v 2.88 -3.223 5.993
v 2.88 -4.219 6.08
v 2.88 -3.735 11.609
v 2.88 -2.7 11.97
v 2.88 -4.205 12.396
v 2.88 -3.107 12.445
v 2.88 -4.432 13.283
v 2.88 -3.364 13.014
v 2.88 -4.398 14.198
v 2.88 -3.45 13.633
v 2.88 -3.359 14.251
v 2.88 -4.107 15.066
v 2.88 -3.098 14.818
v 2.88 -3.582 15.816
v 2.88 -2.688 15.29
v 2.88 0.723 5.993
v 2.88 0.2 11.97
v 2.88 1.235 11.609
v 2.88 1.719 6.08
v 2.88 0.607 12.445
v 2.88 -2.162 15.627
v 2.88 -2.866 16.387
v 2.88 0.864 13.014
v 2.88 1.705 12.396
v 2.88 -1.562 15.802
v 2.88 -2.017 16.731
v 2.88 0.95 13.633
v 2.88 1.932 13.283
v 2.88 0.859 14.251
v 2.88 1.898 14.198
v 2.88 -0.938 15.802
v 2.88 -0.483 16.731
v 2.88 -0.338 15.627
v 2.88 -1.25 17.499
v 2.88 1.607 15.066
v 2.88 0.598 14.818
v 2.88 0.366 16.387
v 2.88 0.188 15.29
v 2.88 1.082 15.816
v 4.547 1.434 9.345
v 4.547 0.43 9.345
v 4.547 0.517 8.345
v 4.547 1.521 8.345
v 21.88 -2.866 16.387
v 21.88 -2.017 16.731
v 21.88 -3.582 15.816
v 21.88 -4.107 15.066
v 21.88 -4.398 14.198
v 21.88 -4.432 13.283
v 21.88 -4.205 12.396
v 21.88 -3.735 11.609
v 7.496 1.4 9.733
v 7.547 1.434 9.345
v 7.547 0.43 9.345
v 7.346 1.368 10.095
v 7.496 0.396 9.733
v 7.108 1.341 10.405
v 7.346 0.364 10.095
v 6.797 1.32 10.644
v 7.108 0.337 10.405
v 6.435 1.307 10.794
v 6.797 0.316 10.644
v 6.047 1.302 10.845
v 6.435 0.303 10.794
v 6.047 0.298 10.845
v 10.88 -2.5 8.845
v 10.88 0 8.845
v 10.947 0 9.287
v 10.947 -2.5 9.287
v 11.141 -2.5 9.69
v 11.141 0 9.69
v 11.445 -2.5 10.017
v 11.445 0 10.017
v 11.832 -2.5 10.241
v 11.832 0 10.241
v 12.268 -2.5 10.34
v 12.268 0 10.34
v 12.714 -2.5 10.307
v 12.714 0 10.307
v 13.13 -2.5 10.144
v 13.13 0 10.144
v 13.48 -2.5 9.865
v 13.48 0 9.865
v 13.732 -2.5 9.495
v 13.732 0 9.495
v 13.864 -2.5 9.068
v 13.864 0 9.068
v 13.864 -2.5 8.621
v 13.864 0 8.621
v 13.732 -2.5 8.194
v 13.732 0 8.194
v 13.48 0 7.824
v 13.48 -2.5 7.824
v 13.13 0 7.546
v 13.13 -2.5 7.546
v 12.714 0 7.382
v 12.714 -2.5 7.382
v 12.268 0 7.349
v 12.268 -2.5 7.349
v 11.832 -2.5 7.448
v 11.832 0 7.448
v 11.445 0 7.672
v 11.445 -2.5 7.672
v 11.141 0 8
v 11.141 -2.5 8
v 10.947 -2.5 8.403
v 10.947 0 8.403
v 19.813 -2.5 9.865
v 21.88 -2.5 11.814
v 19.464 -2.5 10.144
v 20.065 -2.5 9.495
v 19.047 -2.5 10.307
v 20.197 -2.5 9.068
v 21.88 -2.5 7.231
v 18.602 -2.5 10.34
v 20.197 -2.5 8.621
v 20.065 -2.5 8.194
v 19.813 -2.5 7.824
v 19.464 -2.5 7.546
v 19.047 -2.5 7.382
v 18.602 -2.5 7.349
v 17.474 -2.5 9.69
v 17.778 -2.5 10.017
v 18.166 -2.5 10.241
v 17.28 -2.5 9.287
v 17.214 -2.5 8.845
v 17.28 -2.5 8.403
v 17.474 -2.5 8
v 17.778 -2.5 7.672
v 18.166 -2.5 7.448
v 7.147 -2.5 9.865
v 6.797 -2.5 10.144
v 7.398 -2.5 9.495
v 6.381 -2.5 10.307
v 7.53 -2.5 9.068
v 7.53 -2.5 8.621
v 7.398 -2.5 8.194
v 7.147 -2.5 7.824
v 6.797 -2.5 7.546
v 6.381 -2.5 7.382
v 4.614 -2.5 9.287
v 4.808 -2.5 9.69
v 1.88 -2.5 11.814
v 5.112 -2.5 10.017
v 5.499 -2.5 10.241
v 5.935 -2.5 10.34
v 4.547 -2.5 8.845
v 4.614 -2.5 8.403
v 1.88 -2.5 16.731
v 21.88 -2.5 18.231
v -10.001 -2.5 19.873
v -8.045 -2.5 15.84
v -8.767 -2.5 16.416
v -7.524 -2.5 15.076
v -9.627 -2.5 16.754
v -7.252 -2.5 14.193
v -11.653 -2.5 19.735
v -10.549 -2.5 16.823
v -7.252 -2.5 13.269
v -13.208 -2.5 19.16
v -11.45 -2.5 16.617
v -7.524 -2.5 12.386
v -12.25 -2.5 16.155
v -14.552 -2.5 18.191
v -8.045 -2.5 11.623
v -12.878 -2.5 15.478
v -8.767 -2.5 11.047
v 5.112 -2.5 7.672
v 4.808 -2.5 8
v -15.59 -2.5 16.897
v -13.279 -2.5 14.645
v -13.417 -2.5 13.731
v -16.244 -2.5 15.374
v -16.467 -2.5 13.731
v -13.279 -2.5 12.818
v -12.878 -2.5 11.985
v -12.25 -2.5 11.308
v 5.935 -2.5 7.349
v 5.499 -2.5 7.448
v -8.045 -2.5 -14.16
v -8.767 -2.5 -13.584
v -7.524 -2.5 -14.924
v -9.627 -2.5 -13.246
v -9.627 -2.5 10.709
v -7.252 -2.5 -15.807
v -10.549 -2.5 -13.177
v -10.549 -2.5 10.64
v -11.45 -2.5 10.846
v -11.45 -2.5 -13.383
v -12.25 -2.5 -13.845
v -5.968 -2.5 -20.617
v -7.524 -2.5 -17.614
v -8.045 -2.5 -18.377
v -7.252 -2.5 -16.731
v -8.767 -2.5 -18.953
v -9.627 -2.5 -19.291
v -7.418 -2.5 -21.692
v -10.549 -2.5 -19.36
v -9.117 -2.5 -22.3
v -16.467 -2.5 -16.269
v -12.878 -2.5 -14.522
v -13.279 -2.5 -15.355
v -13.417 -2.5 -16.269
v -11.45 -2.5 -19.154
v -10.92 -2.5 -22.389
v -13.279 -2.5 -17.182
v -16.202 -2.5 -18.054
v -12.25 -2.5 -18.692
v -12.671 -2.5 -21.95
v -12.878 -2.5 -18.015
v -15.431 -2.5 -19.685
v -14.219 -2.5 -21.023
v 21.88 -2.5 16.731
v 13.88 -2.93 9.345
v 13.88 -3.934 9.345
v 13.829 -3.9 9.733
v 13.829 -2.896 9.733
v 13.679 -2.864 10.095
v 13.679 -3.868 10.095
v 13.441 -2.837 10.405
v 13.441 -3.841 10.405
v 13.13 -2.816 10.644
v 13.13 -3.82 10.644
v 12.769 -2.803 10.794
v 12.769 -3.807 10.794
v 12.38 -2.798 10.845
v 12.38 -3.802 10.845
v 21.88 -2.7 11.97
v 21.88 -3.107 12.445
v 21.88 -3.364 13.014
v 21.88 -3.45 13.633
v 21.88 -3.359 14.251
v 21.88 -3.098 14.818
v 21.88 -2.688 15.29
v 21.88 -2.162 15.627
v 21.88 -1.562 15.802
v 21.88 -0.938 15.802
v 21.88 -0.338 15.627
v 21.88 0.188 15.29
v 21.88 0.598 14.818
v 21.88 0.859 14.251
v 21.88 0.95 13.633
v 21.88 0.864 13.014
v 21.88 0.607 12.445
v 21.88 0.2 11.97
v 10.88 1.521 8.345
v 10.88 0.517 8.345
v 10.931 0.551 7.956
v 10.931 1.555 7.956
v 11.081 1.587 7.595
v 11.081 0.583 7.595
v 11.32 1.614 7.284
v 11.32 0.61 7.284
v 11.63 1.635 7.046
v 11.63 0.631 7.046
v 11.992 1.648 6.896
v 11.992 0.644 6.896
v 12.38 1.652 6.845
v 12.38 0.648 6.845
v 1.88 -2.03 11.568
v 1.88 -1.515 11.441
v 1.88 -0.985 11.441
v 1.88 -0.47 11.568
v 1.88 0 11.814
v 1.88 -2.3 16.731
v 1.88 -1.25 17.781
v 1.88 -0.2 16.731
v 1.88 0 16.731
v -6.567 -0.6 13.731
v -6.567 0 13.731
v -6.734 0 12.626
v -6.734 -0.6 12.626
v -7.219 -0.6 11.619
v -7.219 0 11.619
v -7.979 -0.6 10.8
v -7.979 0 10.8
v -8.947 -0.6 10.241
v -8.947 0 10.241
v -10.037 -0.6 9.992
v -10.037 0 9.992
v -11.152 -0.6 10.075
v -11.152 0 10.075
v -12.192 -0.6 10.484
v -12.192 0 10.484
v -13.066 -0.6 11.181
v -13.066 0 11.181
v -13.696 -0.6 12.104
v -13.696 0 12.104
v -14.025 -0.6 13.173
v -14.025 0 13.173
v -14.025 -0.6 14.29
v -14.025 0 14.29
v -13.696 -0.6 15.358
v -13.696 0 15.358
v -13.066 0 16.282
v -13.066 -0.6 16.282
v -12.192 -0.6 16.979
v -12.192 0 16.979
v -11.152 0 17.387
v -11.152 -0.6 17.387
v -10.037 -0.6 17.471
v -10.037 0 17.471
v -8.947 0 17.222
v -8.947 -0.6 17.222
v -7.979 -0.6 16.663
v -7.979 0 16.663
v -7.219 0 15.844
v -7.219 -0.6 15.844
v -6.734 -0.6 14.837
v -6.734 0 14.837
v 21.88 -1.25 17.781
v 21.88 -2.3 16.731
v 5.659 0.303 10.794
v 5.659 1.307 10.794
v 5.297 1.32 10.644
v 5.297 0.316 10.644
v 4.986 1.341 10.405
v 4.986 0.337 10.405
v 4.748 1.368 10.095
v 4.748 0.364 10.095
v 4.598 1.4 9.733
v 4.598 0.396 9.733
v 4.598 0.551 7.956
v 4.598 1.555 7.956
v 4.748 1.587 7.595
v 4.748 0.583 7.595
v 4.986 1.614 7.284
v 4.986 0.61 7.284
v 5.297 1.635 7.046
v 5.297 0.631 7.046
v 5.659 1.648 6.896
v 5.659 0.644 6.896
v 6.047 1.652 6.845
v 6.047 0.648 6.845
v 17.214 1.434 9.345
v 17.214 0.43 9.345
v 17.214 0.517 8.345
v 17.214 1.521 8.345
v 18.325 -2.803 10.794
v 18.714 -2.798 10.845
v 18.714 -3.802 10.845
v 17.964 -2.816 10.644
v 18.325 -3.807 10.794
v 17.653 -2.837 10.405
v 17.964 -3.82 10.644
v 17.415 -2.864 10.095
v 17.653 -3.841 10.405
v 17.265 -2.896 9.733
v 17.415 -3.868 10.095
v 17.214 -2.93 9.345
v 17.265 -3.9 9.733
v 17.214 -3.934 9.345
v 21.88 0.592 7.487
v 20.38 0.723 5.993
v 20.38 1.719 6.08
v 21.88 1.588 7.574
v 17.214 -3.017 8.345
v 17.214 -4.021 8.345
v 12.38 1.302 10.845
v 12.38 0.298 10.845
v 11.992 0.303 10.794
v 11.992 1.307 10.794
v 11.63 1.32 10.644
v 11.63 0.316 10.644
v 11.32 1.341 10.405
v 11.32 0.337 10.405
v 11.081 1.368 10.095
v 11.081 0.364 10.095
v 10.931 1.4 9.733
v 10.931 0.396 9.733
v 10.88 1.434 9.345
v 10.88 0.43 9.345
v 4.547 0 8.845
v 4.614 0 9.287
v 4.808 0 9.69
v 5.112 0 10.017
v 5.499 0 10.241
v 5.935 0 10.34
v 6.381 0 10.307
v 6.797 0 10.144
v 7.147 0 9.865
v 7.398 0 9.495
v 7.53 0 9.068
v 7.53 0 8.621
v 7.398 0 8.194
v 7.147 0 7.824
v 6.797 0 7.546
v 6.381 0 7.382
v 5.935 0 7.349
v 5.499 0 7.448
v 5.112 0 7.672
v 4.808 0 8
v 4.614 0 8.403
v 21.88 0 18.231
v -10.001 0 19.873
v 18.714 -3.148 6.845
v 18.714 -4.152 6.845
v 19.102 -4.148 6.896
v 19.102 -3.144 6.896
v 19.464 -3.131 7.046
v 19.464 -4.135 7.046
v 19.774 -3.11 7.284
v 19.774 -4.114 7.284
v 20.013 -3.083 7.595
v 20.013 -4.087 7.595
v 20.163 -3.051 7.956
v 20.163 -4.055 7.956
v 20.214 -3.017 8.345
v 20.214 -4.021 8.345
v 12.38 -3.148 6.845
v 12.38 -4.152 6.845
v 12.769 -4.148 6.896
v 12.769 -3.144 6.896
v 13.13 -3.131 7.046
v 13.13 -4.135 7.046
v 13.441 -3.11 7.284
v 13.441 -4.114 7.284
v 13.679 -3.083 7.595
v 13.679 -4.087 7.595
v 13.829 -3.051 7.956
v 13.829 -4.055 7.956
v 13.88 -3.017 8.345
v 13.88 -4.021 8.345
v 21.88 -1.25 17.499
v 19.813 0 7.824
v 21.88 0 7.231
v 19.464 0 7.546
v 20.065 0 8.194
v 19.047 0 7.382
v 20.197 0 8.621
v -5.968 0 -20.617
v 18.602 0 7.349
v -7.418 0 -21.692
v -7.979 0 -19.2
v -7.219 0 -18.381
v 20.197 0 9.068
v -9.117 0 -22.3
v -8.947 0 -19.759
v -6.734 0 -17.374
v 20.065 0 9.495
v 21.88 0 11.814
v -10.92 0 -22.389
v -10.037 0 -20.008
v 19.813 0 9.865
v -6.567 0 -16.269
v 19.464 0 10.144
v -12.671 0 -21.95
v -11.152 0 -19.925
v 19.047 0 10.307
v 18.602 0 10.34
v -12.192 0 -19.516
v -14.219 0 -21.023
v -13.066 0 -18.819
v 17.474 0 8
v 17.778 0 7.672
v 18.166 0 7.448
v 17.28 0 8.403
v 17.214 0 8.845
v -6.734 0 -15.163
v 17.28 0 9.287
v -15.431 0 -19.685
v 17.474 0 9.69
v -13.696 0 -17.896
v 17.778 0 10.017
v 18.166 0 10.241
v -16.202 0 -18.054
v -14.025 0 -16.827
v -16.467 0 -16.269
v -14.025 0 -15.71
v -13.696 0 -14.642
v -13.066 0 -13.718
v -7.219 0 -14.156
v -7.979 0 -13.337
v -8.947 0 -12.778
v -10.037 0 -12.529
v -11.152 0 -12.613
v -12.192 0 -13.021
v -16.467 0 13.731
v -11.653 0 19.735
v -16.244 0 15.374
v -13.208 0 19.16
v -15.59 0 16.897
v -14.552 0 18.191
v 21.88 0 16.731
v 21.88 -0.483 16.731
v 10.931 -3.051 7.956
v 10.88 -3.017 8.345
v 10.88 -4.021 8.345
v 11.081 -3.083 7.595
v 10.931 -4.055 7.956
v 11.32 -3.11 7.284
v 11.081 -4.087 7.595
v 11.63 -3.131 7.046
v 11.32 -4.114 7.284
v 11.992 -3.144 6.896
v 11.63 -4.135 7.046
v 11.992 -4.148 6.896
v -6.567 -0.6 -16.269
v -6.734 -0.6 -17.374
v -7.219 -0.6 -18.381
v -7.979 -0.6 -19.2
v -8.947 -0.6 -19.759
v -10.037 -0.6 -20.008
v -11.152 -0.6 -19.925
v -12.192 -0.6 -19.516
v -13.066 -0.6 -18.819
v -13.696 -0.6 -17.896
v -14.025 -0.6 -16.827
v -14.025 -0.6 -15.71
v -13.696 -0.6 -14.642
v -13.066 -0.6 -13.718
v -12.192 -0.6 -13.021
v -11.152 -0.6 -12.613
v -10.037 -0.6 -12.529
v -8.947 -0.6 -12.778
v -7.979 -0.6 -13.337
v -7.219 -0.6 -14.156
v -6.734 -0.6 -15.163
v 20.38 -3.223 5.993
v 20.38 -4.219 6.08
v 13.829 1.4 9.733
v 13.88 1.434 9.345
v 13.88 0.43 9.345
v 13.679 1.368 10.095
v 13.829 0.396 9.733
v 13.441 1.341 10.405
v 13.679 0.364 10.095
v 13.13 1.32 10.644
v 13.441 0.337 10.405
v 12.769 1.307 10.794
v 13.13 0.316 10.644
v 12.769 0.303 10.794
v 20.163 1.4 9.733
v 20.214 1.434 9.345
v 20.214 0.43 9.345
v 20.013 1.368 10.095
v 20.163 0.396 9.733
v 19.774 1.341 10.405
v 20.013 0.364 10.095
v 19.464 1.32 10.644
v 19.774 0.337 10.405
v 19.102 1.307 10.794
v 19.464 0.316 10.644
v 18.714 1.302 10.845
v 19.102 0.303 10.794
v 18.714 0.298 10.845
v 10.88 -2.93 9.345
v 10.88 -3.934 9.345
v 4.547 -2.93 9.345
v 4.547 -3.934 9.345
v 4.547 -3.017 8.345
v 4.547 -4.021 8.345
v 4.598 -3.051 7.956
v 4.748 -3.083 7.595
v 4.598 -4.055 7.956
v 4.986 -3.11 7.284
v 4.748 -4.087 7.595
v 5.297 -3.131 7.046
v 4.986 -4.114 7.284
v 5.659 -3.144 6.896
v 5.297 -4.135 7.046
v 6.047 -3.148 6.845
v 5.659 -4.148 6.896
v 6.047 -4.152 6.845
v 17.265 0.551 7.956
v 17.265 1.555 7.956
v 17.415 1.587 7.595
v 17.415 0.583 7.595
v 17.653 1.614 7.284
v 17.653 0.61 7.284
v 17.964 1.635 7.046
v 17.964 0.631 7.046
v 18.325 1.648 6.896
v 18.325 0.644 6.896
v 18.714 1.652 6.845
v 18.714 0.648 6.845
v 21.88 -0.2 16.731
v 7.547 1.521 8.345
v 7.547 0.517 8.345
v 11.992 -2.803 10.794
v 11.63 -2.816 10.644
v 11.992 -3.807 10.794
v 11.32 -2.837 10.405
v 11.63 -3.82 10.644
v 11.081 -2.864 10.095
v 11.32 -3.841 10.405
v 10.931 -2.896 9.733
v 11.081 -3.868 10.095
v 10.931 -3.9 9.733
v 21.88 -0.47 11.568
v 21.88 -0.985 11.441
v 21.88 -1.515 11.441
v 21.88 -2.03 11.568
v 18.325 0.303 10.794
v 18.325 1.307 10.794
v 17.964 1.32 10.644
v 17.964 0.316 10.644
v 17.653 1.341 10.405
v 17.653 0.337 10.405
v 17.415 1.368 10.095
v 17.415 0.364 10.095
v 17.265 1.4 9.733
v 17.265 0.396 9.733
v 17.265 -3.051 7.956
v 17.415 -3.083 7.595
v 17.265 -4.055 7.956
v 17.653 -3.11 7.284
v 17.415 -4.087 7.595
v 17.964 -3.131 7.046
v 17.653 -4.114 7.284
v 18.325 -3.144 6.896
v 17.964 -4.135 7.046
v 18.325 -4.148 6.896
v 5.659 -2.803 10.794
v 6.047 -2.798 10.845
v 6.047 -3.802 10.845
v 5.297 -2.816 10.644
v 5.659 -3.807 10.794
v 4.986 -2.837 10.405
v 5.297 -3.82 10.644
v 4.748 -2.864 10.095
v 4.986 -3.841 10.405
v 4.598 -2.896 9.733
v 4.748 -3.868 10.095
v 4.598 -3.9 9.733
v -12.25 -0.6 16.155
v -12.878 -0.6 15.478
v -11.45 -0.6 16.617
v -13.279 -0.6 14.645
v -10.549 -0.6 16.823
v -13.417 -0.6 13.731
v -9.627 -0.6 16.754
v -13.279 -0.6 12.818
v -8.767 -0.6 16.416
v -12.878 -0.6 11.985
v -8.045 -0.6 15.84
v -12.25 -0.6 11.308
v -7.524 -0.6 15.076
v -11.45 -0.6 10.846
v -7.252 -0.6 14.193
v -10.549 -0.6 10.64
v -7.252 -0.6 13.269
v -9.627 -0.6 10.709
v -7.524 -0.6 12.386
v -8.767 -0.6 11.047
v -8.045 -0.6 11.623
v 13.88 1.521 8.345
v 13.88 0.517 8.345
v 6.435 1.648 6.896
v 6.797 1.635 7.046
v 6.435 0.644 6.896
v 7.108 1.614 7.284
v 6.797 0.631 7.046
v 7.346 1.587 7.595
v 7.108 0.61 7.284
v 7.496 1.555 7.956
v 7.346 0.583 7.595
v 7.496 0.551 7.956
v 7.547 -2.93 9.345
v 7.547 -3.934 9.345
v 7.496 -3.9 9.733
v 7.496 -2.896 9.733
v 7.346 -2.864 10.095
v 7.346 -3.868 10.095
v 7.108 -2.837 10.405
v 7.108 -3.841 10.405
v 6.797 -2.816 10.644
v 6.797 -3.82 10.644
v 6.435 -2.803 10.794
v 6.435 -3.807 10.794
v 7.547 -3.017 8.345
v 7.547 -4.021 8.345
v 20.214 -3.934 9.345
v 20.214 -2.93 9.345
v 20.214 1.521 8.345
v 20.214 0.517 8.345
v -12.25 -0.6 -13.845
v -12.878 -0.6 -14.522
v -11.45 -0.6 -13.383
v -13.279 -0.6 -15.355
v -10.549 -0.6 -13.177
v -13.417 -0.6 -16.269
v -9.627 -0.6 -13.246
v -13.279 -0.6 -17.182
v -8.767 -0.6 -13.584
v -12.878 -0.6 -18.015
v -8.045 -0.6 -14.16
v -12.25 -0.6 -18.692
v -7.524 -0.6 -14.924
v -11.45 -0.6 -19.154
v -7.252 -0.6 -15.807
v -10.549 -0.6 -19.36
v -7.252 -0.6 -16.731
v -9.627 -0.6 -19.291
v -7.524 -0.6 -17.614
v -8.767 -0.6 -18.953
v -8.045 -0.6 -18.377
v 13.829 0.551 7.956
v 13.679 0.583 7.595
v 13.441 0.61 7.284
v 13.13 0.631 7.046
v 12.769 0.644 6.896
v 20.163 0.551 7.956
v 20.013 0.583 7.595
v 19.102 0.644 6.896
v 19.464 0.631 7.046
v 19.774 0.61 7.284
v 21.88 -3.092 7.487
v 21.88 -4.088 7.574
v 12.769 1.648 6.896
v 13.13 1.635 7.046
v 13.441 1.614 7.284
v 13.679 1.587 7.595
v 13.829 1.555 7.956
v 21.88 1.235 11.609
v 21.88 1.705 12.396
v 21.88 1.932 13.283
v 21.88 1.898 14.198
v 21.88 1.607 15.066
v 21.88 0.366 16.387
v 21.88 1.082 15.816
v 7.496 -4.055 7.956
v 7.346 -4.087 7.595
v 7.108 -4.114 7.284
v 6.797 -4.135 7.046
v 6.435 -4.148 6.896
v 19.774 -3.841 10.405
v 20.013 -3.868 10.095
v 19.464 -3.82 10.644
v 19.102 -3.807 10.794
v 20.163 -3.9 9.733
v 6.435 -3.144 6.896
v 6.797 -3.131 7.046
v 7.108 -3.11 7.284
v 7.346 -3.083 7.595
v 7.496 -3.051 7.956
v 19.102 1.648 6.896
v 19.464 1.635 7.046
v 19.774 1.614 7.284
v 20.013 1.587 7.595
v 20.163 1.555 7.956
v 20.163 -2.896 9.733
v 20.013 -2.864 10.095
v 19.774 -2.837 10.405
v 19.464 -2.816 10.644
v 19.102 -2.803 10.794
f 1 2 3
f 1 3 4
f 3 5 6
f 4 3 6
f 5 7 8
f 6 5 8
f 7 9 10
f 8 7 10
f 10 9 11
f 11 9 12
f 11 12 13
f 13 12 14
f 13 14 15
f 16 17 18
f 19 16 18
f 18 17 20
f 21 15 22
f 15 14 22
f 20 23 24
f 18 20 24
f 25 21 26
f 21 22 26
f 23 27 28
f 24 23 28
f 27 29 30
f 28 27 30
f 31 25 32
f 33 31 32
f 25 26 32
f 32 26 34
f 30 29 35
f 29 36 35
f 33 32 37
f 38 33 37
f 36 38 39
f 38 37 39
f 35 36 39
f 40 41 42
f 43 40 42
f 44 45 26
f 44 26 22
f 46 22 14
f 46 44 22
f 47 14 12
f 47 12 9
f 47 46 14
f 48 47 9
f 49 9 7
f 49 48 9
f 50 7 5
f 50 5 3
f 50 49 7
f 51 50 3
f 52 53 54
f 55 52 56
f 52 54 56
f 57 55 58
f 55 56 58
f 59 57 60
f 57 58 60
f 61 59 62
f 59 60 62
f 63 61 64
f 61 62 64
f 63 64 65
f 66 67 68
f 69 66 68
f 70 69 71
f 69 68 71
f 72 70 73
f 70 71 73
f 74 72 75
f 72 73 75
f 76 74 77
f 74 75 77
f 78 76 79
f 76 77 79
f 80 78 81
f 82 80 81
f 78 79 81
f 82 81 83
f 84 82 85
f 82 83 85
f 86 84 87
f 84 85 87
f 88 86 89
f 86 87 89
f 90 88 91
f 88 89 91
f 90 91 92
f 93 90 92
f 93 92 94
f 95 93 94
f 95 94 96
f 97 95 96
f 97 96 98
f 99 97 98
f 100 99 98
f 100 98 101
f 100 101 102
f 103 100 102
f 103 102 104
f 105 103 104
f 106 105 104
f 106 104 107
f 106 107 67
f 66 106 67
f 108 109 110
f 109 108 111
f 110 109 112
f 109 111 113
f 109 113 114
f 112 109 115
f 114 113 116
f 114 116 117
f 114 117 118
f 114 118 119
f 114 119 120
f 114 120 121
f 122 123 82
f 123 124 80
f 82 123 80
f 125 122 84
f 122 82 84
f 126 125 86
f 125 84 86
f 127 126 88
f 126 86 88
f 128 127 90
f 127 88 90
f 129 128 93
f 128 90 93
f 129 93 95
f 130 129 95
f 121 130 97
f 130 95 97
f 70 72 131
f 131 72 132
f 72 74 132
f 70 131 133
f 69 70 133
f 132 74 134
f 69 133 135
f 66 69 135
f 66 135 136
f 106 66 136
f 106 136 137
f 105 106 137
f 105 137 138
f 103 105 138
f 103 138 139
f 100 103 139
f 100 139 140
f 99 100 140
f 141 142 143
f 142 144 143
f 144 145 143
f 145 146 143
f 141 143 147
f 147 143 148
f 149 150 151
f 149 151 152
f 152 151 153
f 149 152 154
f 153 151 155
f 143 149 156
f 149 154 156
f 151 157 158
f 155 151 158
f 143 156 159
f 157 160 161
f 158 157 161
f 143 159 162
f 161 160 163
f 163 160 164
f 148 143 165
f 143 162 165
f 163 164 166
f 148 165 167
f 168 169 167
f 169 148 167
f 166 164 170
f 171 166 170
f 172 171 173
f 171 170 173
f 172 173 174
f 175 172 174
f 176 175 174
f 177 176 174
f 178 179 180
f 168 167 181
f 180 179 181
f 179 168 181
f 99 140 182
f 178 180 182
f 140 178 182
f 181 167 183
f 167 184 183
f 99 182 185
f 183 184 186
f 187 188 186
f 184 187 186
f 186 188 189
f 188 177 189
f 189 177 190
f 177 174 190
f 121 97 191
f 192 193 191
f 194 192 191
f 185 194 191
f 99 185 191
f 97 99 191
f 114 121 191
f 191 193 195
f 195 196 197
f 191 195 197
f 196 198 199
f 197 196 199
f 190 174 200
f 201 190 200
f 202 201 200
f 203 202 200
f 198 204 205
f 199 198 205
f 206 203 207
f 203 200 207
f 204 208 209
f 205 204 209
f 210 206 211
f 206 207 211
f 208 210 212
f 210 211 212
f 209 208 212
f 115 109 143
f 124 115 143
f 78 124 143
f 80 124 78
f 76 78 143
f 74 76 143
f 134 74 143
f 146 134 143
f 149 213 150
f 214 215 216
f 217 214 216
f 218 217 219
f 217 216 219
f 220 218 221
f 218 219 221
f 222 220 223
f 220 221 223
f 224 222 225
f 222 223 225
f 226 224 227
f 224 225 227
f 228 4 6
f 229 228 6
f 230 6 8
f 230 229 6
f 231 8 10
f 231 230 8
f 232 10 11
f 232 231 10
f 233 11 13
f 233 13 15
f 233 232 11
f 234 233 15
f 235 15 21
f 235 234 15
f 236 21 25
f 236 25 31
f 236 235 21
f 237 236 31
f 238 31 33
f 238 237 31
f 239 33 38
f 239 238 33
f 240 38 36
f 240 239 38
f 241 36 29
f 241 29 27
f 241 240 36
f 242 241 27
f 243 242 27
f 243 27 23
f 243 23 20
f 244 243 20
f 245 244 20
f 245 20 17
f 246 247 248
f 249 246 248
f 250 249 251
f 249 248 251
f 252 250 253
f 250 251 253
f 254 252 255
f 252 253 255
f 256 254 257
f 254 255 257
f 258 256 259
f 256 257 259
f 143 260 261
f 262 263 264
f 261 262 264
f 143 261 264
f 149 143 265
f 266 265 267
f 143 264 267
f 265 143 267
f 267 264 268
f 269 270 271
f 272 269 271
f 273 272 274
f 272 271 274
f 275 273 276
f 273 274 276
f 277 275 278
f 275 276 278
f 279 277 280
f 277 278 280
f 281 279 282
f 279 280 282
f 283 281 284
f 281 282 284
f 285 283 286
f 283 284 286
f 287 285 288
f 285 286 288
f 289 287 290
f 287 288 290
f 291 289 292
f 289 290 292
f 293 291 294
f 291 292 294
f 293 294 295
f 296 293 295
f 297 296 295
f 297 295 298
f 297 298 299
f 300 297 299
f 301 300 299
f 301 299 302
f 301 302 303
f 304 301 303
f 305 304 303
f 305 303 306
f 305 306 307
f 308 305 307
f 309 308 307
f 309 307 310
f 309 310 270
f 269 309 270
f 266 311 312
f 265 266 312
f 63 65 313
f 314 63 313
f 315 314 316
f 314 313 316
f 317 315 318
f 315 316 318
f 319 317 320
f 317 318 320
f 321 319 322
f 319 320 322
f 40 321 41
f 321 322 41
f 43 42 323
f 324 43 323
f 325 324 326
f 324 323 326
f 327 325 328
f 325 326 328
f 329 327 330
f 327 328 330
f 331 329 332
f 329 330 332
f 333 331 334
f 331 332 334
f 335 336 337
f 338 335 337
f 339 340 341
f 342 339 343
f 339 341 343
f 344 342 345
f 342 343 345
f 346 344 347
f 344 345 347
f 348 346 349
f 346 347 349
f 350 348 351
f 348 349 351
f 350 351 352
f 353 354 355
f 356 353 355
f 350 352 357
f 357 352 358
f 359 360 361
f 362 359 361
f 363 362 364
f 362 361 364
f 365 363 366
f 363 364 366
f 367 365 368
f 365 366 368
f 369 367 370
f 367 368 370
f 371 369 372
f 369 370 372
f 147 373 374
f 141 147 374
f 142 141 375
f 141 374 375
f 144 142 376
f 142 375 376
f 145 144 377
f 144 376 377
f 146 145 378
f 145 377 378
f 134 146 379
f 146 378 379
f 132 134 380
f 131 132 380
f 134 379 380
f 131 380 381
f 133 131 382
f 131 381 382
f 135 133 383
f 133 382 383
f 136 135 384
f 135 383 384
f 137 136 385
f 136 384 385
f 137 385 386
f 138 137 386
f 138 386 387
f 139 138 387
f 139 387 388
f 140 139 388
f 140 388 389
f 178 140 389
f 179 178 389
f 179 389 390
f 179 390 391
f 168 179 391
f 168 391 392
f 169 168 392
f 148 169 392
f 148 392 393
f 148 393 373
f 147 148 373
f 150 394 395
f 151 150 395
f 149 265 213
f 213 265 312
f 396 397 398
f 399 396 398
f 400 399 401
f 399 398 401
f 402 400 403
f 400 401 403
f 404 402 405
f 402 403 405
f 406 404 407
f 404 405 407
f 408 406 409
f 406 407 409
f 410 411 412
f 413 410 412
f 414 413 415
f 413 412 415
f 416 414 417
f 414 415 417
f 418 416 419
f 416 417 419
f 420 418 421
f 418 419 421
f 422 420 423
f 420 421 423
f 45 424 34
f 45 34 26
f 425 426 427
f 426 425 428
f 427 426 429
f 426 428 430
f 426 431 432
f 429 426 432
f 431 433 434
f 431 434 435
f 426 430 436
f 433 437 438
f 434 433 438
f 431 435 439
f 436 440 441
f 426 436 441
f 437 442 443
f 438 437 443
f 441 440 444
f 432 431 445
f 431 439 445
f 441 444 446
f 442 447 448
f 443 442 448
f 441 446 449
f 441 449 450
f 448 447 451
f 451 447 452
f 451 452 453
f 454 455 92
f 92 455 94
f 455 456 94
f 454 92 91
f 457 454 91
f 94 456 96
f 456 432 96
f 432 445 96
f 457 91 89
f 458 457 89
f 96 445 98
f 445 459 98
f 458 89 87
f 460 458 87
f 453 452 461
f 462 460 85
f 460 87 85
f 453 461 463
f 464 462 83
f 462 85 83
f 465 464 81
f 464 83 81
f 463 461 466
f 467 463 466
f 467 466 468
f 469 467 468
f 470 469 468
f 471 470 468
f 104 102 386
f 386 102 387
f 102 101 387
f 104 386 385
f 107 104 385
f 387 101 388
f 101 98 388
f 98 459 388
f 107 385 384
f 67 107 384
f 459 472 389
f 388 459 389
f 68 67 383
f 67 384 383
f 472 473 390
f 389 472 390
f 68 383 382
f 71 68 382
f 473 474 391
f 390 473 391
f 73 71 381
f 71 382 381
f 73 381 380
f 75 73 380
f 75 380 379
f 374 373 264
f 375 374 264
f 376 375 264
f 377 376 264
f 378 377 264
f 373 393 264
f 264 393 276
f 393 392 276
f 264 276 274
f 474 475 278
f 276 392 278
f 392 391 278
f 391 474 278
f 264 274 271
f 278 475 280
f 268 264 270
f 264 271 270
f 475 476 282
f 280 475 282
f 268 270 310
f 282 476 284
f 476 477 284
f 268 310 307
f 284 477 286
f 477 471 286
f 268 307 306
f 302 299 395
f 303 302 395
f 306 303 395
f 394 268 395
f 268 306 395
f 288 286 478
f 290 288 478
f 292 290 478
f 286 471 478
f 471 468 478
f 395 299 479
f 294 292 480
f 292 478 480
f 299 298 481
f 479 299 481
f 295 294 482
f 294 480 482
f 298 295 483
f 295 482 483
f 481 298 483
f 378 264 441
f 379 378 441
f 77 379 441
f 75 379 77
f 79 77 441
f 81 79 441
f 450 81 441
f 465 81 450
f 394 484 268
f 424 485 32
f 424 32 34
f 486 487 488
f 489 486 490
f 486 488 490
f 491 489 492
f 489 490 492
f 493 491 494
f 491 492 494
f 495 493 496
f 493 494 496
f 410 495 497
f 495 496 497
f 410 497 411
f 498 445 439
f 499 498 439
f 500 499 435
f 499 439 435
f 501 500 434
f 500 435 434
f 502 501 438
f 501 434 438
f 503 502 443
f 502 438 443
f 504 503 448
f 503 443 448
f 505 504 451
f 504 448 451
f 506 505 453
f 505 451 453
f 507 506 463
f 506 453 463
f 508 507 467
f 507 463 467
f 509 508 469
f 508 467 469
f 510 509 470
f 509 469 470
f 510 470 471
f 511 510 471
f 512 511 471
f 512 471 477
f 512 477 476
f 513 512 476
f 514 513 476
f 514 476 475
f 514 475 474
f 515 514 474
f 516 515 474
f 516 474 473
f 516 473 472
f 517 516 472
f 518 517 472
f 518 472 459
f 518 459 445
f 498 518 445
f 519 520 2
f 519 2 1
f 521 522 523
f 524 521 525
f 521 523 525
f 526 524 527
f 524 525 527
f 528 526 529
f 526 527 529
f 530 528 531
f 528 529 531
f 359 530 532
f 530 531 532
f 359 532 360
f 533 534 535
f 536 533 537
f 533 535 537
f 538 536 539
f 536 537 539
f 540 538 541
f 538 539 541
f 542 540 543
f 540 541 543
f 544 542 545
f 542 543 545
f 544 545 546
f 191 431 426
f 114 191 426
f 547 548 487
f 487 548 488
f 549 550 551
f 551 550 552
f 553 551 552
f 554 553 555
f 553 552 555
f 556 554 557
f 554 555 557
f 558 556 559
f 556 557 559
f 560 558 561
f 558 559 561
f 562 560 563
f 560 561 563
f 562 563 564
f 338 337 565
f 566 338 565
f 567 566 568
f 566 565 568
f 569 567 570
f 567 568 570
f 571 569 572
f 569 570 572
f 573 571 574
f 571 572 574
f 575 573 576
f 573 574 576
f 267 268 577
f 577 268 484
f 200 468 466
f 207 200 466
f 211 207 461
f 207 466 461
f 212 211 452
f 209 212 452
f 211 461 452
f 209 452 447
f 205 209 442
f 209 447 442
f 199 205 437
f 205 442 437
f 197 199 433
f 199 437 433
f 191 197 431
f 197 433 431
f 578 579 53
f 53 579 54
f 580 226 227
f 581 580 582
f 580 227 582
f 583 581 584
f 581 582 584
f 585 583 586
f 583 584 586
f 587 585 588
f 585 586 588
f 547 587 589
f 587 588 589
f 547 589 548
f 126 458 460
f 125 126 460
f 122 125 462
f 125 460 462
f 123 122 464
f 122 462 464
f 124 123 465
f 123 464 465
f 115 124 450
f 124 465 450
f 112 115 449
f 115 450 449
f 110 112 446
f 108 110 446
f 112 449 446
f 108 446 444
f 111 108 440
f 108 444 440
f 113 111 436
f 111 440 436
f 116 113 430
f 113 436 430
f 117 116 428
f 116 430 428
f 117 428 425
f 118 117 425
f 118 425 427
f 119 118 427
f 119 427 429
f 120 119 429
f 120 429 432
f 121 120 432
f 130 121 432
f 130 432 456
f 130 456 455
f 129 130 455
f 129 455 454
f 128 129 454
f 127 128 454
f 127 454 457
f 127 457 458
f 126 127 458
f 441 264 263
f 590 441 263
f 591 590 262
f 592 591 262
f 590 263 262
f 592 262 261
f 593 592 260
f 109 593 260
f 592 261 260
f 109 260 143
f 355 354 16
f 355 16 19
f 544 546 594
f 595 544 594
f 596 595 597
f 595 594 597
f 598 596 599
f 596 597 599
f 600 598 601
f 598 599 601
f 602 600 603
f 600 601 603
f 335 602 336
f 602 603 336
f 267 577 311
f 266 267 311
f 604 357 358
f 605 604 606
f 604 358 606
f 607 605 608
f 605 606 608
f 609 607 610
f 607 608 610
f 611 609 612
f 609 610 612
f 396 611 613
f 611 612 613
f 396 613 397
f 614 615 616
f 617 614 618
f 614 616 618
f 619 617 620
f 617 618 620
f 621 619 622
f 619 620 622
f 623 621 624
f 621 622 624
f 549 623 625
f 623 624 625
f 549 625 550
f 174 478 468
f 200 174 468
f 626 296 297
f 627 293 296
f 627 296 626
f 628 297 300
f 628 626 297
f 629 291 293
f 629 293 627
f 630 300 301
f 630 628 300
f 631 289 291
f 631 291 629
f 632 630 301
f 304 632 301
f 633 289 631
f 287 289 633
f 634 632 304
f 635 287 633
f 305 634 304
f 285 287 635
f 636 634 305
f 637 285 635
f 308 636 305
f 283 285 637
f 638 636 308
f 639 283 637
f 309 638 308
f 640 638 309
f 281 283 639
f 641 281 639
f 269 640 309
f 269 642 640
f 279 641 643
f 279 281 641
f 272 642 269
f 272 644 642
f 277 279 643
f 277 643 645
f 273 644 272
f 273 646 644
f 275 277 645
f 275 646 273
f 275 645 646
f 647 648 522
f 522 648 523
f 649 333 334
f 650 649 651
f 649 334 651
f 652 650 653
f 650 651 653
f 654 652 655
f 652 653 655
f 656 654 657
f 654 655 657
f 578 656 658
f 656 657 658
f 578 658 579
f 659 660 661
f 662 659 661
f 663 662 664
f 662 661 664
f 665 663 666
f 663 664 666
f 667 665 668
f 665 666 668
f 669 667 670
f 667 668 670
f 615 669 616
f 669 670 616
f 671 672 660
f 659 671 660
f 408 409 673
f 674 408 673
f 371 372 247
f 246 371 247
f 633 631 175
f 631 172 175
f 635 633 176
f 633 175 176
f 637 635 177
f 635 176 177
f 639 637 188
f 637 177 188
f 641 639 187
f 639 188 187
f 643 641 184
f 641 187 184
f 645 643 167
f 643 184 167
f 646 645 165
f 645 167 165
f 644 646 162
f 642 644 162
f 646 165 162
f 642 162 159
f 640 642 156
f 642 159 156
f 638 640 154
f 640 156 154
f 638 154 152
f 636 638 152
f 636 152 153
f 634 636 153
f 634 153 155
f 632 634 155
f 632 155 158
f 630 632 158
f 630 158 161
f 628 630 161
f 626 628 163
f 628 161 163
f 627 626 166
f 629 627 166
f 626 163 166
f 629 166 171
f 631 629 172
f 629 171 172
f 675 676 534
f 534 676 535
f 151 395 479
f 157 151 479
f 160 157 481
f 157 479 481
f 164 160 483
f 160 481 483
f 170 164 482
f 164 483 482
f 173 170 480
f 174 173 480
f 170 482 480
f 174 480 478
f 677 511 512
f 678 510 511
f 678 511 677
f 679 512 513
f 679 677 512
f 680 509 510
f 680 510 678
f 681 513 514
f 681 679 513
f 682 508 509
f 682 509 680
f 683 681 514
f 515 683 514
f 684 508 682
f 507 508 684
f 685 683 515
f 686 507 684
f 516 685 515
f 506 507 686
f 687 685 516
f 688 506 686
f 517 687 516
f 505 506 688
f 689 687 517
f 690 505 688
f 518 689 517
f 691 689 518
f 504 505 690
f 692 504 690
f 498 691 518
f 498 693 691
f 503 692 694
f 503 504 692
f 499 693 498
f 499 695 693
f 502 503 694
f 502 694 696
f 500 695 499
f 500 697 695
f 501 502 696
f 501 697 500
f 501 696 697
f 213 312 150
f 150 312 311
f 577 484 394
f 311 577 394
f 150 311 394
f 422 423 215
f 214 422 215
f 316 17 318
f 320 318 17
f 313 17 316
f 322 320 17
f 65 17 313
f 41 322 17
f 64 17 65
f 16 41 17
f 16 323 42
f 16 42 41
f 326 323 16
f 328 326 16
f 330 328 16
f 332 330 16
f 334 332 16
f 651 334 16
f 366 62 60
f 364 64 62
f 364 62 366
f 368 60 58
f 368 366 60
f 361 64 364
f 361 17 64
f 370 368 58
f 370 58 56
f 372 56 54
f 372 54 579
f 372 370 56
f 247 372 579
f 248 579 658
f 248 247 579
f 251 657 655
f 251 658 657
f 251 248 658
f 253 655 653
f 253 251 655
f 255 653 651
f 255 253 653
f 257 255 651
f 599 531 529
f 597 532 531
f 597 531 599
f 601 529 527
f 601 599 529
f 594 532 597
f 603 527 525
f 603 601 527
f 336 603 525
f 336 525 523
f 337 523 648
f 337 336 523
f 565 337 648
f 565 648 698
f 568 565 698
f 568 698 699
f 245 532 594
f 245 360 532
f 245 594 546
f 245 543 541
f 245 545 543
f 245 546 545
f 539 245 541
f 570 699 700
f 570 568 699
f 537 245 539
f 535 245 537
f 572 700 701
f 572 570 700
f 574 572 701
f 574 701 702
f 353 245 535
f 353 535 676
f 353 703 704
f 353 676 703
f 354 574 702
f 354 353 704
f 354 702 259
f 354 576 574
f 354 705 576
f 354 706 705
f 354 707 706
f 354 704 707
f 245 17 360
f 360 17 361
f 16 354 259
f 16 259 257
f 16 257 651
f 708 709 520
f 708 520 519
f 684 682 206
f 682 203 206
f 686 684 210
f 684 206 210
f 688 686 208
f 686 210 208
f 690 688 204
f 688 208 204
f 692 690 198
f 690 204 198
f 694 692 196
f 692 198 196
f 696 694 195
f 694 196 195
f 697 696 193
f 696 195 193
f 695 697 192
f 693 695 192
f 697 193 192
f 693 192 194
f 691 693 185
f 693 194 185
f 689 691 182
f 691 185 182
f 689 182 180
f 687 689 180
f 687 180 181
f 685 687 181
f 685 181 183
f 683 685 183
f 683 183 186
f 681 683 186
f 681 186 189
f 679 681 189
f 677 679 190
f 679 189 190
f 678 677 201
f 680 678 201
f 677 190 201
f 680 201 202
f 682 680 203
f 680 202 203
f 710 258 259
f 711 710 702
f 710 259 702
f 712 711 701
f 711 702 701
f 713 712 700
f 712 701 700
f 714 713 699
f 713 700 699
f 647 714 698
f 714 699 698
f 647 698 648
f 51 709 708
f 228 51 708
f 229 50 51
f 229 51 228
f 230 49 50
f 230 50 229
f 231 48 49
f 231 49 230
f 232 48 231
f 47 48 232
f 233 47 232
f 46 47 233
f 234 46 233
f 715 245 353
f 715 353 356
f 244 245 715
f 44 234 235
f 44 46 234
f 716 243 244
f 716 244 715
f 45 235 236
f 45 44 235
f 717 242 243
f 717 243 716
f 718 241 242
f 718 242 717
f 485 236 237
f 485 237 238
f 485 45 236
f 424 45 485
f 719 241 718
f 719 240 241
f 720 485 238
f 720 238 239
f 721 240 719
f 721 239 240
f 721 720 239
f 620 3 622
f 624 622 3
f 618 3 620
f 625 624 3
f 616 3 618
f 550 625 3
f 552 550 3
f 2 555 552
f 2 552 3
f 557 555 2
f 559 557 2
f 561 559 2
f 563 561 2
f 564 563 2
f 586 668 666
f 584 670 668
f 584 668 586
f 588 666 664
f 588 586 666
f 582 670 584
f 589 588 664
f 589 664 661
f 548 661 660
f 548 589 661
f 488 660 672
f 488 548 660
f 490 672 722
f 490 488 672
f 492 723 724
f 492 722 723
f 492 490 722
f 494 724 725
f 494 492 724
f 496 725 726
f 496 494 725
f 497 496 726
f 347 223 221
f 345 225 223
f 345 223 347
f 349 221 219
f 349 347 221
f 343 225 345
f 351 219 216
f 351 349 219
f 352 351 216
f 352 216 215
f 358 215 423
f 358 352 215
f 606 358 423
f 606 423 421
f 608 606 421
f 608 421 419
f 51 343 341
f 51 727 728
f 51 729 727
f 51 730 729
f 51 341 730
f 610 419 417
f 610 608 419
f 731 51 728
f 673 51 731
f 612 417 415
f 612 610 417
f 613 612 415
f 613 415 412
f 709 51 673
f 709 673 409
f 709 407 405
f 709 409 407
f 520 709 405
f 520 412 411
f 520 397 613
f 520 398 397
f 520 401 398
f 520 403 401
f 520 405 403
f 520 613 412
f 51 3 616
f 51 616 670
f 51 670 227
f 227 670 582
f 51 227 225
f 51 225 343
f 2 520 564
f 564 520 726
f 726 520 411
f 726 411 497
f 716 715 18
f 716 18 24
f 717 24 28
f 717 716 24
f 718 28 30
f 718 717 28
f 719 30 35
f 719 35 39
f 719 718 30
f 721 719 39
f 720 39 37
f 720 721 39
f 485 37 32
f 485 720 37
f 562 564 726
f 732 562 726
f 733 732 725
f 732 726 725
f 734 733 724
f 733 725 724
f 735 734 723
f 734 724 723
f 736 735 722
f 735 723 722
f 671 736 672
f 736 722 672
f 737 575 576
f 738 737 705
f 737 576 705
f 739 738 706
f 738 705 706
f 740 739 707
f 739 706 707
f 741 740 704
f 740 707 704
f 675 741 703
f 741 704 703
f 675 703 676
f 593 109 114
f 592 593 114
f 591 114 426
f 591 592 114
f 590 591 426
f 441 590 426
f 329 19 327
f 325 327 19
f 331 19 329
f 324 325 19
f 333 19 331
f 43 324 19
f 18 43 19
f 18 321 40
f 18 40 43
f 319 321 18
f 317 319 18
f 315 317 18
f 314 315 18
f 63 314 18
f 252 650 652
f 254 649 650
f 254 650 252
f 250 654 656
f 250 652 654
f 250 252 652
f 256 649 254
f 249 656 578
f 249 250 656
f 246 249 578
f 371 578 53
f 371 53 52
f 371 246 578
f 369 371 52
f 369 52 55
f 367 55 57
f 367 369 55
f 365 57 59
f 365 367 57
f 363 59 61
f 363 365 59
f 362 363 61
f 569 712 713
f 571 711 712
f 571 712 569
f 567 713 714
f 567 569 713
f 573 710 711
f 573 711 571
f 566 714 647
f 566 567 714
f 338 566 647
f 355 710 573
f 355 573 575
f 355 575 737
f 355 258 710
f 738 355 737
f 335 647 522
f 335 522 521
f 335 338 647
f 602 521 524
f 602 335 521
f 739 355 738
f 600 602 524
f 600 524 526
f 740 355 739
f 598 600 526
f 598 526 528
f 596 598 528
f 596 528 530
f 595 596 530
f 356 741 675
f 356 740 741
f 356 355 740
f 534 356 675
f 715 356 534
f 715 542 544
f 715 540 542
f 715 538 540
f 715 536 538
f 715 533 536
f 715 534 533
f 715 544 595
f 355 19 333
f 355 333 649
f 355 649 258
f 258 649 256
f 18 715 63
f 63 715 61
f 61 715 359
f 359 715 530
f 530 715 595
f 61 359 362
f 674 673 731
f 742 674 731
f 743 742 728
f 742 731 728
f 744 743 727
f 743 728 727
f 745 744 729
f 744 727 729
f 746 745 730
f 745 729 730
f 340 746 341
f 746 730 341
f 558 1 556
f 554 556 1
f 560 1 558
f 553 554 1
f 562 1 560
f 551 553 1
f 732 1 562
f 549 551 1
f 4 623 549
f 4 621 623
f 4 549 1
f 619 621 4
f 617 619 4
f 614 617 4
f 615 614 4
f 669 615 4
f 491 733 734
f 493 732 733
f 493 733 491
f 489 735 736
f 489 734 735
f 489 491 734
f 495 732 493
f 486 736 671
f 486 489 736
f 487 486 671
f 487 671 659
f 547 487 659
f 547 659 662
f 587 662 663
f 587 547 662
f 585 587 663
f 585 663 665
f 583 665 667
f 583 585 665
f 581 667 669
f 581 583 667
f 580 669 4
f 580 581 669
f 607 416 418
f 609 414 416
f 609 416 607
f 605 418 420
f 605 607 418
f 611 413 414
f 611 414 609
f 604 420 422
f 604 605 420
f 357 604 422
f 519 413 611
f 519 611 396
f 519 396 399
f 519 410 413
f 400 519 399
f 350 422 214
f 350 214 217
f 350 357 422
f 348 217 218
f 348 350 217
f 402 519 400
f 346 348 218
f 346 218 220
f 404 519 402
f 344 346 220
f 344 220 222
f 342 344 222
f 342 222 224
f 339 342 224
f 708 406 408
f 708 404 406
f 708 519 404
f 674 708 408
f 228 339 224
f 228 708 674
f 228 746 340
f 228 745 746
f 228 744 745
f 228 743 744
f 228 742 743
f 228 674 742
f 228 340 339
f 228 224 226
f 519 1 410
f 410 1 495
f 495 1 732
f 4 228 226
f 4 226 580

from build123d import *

# Parameters (mm, degrees)
F1_DEPTH        = 2.5
F3_DEPTH        = 20
F6_DEPTH        = 19
F8_DEPTH        = 20
F11_D           = 3
F11_DEPTH       = 5
F11_START       = 5
F11_TIP         = 0.9012909285
F12_DEPTH       = 25
F13_SIZE        = 1.5
F14_D           = 6.2
F14_DEPTH       = 5
F14_CBORE_D     = 7.5
F14_CBORE_DEPTH = 0.6
F14_TIP         = 1.862667919


with BuildPart() as f1:
    # F0 (on Front) → F1 (new body)
    with BuildSketch(Plane.XZ):
        with BuildLine():
            ThreePointArc((-10.0007775515, 19.8732864219), (-14.5524809274, 18.190560255), (-16.4670801936, 13.7314257398))
            Line((-16.4670801936, 13.7314257398), (-16.4670801936, -16.2685742602))
            ThreePointArc((-16.4670801936, -16.2685742602), (-12.6705833026, -21.9504333851), (-5.9683734893, -20.6172809645))
            Line((-5.9683734893, -20.6172809645), (21.880333215, 7.2314257398))
            Line((21.880333215, 7.2314257398), (21.880333215, 10.7314257398))
            Line((21.880333215, 10.7314257398), (1.880333215, 10.7314257398))
            Line((1.880333215, 10.7314257398), (1.880333215, 16.7314257398))
            Line((1.880333215, 16.7314257398), (21.880333215, 16.7314257398))
            Line((21.880333215, 16.7314257398), (21.880333215, 18.2314257398))
            Line((21.880333215, 18.2314257398), (-10.0007775515, 19.8732864219))
        make_face()
    extrude(amount=F1_DEPTH)

    # F2 (on face) → F3 (cut, through all)
    with BuildSketch(Plane.YZ.offset(21.880333215)):
        Polygon((-1.25, 17.7814257398), (-2.3, 16.7314257398), (-0.2, 16.7314257398), align=None)
    extrude(amount=-F3_DEPTH, mode=Mode.SUBTRACT)

    # F7 (on face) → F8 (join, through all)
    with BuildSketch(Plane.YZ.offset(1.880333215)):
        with BuildLine():
            Line((-2.5, 11.8143575804), (-2.5, 10.7314257398))
            Line((-2.5, 10.7314257398), (0, 10.7314257398))
            Line((0, 10.7314257398), (0, 11.8143575804))
            ThreePointArc((0, 11.8143575804), (-1.25, 11.4247442795), (-2.5, 11.8143575804))
        make_face()
    extrude(amount=F8_DEPTH)

    # F11
    # its depths count from where the whole tool has entered the part; down to there all is cleared
    with Locations(Plane.XZ.offset(7.5).offset(-F11_START)):
        with Locations((6.0469998817, 8.8446571536), (12.380333215, 8.8446571536), (18.7136665483, 8.8446571536)):
            Hole(F11_D / 2, depth=F11_DEPTH)
            with Locations((0, 0, -(F11_DEPTH + F11_TIP / 2))):  # 118° drill point
                Cone(0, F11_D / 2, F11_TIP, mode=Mode.SUBTRACT)

    # F14
    with Locations(Plane(origin=(0, 0, 0), x_dir=(1, 0, 0), z_dir=(0, 1, 0))):
        with Locations((-10.3170801936, -13.7314257398), (-10.3170801936, 16.2685742602)):
            CounterBoreHole(F14_D / 2, F14_CBORE_D / 2, F14_CBORE_DEPTH, depth=F14_DEPTH)
            with Locations((0, 0, -(F14_DEPTH + F14_TIP / 2))):  # 118° drill point
                Cone(0, F14_D / 2, F14_TIP, mode=Mode.SUBTRACT)


with BuildPart() as f6:
    # F5 (on offset) → F6 (new body)
    with BuildSketch(Plane.YZ.offset(21.880333215)):
        with BuildLine():
            ThreePointArc((-2.7, 11.9702050687), (-1.25, 15.8247442795), (0.2, 11.9702050687))
            Line((0.2, 11.9702050687), (0.7229344565, 5.9930368801))
            Line((0.7229344565, 5.9930368801), (1.7191291546, 6.0801926229))
            Line((1.7191291546, 6.0801926229), (1.2354105403, 11.6091216842))
            ThreePointArc((1.2354105403, 11.6091216842), (1.7838587769, 14.642438203), (-0.4828427125, 16.7314257398))
            Line((-0.4828427125, 16.7314257398), (-1.25, 17.4985830274))
            Line((-1.25, 17.4985830274), (-2.0171572875, 16.7314257398))
            ThreePointArc((-2.0171572875, 16.7314257398), (-4.2838587769, 14.642438203), (-3.7354105403, 11.6091216842))
            Line((-3.7354105403, 11.6091216842), (-4.2191291546, 6.0801926229))
            Line((-4.2191291546, 6.0801926229), (-3.2229344565, 5.9930368801))
            Line((-3.2229344565, 5.9930368801), (-2.7, 11.9702050687))
        make_face()
    extrude(amount=-F6_DEPTH)

    # F10 (on offset) → F12 (cut)
    with BuildSketch(Plane.XZ.offset(7.5)):
        with BuildLine():
            ThreePointArc((4.5469998817, 8.3446571536), (4.9863397099, 7.2839969818), (6.0469998817, 6.8446571536))
            ThreePointArc((6.0469998817, 6.8446571536), (7.1076600534, 7.2839969818), (7.5469998817, 8.3446571536))
            Line((7.5469998817, 8.3446571536), (7.5469998817, 9.3446571536))
            ThreePointArc((7.5469998817, 9.3446571536), (7.1076600534, 10.4053173253), (6.0469998817, 10.8446571536))
            ThreePointArc((6.0469998817, 10.8446571536), (4.9863397099, 10.4053173253), (4.5469998817, 9.3446571536))
            Line((4.5469998817, 9.3446571536), (4.5469998817, 8.3446571536))
        make_face()
        with BuildLine():
            ThreePointArc((10.880333215, 8.3446571536), (11.3196730432, 7.2839969818), (12.380333215, 6.8446571536))
            ThreePointArc((12.380333215, 6.8446571536), (13.4409933868, 7.2839969818), (13.880333215, 8.3446571536))
            Line((13.880333215, 8.3446571536), (13.880333215, 9.3446571536))
            ThreePointArc((13.880333215, 9.3446571536), (13.4409933904, 10.4053173217), (12.3803332253, 10.8446571536))
            ThreePointArc((12.3803332253, 10.8446571536), (11.3196730469, 10.405317329), (10.880333215, 9.3446571536))
            Line((10.880333215, 9.3446571536), (10.880333215, 8.3446571536))
        make_face()
        with BuildLine():
            ThreePointArc((17.2136665483, 8.3446571536), (17.6530063743, 7.283996984), (18.7136665419, 6.8446571536))
            ThreePointArc((18.7136665419, 6.8446571536), (19.7743267179, 7.2839969795), (20.2136665483, 8.3446571536))
            Line((20.2136665483, 8.3446571536), (20.2136665483, 9.3446571536))
            ThreePointArc((20.2136665483, 9.3446571536), (19.7743267201, 10.4053173253), (18.7136665483, 10.8446571536))
            ThreePointArc((18.7136665483, 10.8446571536), (17.6530063766, 10.4053173253), (17.2136665483, 9.3446571536))
            Line((17.2136665483, 9.3446571536), (17.2136665483, 8.3446571536))
        make_face()
    extrude(amount=-F12_DEPTH, mode=Mode.SUBTRACT)

    # F13
    f13_edges = [f6.edges().sort_by_distance(p)[0] for p in [
        (21.880333, -3.721032, 6.036615),
        (21.880333, 1.221032, 6.036615),
    ]]
    chamfer(f13_edges, length=F13_SIZE)


solid = Compound([f1.part, f6.part])
